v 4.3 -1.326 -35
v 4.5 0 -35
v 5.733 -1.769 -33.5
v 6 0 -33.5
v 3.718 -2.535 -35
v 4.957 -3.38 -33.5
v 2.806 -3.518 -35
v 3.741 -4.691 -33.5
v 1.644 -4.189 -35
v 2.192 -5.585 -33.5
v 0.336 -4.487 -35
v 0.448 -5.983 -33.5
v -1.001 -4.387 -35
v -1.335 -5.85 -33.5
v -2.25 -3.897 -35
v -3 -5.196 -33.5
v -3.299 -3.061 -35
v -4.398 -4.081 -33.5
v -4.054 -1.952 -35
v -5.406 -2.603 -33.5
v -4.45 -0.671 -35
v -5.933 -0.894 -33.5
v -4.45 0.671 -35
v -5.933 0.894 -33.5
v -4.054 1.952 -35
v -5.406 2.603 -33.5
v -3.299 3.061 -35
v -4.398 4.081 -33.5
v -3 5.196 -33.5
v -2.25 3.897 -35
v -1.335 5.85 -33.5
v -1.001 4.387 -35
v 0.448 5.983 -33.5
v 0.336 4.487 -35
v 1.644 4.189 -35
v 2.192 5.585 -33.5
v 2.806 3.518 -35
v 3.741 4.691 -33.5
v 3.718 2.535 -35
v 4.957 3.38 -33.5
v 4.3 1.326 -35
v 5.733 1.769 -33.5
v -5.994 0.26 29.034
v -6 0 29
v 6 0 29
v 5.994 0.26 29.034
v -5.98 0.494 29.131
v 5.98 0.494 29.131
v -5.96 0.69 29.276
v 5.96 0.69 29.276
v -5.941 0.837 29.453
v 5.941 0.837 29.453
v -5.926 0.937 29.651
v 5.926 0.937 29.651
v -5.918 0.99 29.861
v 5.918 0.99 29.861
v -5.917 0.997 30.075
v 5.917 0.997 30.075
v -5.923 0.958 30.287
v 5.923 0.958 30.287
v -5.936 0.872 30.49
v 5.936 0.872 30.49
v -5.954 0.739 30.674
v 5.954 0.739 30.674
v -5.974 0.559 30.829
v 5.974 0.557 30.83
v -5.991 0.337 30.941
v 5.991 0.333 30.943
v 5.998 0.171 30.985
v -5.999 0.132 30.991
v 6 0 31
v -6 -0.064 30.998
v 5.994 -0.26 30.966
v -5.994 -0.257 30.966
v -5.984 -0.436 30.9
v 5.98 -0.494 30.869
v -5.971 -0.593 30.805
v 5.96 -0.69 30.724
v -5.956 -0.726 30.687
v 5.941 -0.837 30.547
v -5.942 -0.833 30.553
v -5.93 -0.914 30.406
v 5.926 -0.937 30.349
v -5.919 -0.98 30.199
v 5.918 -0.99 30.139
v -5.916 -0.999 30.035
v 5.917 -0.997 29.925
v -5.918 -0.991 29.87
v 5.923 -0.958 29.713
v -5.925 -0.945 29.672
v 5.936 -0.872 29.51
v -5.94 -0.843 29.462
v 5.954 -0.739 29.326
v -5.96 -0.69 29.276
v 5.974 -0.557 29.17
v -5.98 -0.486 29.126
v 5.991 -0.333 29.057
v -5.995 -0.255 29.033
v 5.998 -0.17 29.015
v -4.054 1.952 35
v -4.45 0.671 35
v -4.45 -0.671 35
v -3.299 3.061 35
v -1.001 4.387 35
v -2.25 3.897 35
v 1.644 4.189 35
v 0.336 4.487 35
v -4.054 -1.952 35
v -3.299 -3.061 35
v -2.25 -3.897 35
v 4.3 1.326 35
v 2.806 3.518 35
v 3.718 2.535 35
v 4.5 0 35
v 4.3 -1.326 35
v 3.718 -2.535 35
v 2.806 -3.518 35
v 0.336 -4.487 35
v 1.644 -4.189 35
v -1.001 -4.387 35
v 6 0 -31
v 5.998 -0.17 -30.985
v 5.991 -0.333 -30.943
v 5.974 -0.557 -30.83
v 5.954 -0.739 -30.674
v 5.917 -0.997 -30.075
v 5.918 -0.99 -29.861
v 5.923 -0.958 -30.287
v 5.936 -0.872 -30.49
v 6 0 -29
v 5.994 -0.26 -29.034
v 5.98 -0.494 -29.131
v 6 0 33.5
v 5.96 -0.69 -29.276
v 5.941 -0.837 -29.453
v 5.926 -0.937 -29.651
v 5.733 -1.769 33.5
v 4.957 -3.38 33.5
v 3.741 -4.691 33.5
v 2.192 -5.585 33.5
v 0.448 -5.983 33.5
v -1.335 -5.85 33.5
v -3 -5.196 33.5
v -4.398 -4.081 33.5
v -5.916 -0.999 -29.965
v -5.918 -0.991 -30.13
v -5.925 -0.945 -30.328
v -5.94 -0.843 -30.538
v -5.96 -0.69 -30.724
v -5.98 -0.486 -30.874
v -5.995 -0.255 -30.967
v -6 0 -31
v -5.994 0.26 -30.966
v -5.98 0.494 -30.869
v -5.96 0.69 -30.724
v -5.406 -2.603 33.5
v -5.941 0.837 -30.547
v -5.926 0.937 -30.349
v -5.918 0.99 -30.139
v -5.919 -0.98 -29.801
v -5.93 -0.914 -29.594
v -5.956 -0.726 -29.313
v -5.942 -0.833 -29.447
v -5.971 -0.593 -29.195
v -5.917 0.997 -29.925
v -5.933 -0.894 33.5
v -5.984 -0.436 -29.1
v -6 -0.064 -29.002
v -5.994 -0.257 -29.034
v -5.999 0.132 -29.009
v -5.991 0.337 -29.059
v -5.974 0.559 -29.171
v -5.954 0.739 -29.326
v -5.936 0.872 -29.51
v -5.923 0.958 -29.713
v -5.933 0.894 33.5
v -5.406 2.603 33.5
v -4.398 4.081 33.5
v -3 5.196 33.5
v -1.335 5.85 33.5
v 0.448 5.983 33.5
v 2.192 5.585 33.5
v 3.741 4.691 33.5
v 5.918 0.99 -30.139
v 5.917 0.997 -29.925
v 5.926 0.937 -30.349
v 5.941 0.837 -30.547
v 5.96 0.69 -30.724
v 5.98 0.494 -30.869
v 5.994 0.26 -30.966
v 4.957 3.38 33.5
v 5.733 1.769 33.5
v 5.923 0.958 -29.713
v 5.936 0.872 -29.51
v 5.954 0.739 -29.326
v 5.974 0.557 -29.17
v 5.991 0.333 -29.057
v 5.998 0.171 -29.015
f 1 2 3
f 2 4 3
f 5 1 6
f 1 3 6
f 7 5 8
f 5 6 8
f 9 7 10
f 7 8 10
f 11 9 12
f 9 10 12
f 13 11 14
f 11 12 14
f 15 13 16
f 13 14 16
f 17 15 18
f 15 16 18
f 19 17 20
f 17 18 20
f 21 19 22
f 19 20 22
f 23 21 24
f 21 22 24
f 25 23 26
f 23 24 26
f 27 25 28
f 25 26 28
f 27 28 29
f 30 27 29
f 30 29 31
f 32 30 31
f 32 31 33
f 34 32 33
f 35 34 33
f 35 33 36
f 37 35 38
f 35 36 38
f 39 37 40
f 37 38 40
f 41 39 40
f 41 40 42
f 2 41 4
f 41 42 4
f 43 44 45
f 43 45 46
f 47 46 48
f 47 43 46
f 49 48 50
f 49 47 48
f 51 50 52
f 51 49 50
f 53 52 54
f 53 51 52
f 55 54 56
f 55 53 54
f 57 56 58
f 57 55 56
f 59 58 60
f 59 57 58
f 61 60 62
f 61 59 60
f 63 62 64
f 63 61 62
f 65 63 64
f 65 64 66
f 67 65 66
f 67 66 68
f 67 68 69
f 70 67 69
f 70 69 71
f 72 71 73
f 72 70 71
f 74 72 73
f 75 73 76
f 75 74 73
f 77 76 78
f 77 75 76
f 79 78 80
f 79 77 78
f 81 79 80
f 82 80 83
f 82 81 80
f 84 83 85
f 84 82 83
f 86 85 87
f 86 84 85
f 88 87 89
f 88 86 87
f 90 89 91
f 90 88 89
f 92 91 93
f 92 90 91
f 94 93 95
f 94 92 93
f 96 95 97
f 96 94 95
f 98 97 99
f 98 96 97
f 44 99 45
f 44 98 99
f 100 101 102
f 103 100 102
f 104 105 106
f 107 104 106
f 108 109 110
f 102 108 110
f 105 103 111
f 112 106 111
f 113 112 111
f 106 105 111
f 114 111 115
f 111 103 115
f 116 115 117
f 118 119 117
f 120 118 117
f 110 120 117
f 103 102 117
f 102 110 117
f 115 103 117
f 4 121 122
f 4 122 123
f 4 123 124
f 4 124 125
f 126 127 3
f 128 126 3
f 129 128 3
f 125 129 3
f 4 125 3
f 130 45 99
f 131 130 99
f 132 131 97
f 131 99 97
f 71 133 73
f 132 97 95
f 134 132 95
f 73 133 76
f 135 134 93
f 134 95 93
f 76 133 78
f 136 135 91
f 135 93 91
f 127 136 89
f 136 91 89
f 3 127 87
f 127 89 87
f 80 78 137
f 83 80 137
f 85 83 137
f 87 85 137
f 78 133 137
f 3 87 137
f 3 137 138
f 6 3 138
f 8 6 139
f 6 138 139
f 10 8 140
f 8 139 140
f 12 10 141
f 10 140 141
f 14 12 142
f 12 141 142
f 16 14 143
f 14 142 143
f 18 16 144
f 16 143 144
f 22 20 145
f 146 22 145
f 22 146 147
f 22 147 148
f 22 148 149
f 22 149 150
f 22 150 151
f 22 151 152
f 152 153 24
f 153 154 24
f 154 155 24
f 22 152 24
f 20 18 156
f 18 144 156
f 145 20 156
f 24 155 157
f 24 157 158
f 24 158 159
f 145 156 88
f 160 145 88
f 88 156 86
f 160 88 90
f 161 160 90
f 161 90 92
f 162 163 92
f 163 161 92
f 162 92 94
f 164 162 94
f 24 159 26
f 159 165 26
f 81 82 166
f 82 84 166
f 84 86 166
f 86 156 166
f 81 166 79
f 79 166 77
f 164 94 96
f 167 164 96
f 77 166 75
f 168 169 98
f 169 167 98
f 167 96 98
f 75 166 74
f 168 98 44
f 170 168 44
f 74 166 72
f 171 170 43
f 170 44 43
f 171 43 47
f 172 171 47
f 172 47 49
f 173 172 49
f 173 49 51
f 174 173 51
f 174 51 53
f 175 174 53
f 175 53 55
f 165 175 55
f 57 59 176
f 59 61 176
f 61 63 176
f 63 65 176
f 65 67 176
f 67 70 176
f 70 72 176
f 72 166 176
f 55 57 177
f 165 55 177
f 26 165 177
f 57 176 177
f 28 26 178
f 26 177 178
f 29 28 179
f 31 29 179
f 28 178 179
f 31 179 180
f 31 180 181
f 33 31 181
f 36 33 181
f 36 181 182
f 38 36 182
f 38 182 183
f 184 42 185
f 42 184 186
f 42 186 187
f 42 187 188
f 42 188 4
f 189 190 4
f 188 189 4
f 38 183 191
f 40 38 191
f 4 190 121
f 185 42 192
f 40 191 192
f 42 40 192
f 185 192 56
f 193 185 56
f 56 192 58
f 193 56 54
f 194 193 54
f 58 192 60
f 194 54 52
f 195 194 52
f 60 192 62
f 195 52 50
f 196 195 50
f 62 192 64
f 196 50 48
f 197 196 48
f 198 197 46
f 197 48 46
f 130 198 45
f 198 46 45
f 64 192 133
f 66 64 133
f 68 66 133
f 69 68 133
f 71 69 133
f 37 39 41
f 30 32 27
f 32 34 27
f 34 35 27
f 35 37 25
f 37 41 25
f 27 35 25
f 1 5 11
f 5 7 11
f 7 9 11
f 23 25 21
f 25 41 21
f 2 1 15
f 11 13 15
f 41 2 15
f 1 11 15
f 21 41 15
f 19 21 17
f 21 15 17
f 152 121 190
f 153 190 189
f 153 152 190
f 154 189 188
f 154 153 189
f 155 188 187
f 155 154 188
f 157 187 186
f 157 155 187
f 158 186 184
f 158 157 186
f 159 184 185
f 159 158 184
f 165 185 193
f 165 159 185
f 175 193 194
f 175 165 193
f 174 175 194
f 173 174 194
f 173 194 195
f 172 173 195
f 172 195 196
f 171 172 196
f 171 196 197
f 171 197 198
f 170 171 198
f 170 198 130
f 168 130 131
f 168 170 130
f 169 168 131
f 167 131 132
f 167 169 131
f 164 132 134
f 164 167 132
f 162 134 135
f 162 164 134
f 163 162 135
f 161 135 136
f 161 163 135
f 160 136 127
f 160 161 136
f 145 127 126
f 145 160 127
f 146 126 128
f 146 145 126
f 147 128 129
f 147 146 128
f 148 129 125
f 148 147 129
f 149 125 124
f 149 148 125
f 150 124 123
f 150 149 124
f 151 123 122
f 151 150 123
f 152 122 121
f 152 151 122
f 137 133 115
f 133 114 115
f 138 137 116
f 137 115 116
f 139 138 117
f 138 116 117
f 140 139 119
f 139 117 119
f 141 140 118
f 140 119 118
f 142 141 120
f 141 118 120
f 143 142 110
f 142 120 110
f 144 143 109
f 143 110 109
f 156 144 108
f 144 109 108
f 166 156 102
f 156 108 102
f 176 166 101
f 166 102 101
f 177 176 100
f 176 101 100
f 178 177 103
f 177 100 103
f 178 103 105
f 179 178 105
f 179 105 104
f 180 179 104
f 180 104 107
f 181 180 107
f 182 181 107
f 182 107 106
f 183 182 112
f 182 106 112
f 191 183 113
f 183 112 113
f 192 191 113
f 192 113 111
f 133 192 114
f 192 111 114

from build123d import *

# Parameters (mm, degrees)
CUT_EXTRUDE1_DEPTH      = 37.013886211
CUT_EXTRUDE1_DEPTH_BACK = 37.013886211
SKETCH2_R               = 1


with BuildPart() as part:
    # Sketch1 → Revolve1 (revolve)
    with BuildSketch(Plane(origin=(0, 0, 0), x_dir=(0, 0, -1), z_dir=(1, 0, 0)), mode=Mode.PRIVATE) as revolve1_sk:
        Polygon((35, 0), (35, 4.5), (33.5, 6), (-33.5, 6), (-35, 4.5), (-35, 0), align=None)
    revolve(revolve1_sk.sketch.rotate(Axis((0, 0, 35), (0, 0, -1)), 90), axis=Axis((0, 0, 35), (0, 0, -1)))

    # Sketch2 → Cut-Extrude1 (cut, two sides: drawn at the far end of the back side and taken through both)
    with BuildSketch(Plane(origin=(0, 0, 0), x_dir=(0, 0, -1), z_dir=(1, 0, 0)).offset(-CUT_EXTRUDE1_DEPTH_BACK)):
        with Locations((30, 0)):
            Circle(SKETCH2_R)
        with Locations((-30, 0)):
            Circle(SKETCH2_R)
    extrude(amount=CUT_EXTRUDE1_DEPTH + CUT_EXTRUDE1_DEPTH_BACK, mode=Mode.SUBTRACT)


solid = part.part
